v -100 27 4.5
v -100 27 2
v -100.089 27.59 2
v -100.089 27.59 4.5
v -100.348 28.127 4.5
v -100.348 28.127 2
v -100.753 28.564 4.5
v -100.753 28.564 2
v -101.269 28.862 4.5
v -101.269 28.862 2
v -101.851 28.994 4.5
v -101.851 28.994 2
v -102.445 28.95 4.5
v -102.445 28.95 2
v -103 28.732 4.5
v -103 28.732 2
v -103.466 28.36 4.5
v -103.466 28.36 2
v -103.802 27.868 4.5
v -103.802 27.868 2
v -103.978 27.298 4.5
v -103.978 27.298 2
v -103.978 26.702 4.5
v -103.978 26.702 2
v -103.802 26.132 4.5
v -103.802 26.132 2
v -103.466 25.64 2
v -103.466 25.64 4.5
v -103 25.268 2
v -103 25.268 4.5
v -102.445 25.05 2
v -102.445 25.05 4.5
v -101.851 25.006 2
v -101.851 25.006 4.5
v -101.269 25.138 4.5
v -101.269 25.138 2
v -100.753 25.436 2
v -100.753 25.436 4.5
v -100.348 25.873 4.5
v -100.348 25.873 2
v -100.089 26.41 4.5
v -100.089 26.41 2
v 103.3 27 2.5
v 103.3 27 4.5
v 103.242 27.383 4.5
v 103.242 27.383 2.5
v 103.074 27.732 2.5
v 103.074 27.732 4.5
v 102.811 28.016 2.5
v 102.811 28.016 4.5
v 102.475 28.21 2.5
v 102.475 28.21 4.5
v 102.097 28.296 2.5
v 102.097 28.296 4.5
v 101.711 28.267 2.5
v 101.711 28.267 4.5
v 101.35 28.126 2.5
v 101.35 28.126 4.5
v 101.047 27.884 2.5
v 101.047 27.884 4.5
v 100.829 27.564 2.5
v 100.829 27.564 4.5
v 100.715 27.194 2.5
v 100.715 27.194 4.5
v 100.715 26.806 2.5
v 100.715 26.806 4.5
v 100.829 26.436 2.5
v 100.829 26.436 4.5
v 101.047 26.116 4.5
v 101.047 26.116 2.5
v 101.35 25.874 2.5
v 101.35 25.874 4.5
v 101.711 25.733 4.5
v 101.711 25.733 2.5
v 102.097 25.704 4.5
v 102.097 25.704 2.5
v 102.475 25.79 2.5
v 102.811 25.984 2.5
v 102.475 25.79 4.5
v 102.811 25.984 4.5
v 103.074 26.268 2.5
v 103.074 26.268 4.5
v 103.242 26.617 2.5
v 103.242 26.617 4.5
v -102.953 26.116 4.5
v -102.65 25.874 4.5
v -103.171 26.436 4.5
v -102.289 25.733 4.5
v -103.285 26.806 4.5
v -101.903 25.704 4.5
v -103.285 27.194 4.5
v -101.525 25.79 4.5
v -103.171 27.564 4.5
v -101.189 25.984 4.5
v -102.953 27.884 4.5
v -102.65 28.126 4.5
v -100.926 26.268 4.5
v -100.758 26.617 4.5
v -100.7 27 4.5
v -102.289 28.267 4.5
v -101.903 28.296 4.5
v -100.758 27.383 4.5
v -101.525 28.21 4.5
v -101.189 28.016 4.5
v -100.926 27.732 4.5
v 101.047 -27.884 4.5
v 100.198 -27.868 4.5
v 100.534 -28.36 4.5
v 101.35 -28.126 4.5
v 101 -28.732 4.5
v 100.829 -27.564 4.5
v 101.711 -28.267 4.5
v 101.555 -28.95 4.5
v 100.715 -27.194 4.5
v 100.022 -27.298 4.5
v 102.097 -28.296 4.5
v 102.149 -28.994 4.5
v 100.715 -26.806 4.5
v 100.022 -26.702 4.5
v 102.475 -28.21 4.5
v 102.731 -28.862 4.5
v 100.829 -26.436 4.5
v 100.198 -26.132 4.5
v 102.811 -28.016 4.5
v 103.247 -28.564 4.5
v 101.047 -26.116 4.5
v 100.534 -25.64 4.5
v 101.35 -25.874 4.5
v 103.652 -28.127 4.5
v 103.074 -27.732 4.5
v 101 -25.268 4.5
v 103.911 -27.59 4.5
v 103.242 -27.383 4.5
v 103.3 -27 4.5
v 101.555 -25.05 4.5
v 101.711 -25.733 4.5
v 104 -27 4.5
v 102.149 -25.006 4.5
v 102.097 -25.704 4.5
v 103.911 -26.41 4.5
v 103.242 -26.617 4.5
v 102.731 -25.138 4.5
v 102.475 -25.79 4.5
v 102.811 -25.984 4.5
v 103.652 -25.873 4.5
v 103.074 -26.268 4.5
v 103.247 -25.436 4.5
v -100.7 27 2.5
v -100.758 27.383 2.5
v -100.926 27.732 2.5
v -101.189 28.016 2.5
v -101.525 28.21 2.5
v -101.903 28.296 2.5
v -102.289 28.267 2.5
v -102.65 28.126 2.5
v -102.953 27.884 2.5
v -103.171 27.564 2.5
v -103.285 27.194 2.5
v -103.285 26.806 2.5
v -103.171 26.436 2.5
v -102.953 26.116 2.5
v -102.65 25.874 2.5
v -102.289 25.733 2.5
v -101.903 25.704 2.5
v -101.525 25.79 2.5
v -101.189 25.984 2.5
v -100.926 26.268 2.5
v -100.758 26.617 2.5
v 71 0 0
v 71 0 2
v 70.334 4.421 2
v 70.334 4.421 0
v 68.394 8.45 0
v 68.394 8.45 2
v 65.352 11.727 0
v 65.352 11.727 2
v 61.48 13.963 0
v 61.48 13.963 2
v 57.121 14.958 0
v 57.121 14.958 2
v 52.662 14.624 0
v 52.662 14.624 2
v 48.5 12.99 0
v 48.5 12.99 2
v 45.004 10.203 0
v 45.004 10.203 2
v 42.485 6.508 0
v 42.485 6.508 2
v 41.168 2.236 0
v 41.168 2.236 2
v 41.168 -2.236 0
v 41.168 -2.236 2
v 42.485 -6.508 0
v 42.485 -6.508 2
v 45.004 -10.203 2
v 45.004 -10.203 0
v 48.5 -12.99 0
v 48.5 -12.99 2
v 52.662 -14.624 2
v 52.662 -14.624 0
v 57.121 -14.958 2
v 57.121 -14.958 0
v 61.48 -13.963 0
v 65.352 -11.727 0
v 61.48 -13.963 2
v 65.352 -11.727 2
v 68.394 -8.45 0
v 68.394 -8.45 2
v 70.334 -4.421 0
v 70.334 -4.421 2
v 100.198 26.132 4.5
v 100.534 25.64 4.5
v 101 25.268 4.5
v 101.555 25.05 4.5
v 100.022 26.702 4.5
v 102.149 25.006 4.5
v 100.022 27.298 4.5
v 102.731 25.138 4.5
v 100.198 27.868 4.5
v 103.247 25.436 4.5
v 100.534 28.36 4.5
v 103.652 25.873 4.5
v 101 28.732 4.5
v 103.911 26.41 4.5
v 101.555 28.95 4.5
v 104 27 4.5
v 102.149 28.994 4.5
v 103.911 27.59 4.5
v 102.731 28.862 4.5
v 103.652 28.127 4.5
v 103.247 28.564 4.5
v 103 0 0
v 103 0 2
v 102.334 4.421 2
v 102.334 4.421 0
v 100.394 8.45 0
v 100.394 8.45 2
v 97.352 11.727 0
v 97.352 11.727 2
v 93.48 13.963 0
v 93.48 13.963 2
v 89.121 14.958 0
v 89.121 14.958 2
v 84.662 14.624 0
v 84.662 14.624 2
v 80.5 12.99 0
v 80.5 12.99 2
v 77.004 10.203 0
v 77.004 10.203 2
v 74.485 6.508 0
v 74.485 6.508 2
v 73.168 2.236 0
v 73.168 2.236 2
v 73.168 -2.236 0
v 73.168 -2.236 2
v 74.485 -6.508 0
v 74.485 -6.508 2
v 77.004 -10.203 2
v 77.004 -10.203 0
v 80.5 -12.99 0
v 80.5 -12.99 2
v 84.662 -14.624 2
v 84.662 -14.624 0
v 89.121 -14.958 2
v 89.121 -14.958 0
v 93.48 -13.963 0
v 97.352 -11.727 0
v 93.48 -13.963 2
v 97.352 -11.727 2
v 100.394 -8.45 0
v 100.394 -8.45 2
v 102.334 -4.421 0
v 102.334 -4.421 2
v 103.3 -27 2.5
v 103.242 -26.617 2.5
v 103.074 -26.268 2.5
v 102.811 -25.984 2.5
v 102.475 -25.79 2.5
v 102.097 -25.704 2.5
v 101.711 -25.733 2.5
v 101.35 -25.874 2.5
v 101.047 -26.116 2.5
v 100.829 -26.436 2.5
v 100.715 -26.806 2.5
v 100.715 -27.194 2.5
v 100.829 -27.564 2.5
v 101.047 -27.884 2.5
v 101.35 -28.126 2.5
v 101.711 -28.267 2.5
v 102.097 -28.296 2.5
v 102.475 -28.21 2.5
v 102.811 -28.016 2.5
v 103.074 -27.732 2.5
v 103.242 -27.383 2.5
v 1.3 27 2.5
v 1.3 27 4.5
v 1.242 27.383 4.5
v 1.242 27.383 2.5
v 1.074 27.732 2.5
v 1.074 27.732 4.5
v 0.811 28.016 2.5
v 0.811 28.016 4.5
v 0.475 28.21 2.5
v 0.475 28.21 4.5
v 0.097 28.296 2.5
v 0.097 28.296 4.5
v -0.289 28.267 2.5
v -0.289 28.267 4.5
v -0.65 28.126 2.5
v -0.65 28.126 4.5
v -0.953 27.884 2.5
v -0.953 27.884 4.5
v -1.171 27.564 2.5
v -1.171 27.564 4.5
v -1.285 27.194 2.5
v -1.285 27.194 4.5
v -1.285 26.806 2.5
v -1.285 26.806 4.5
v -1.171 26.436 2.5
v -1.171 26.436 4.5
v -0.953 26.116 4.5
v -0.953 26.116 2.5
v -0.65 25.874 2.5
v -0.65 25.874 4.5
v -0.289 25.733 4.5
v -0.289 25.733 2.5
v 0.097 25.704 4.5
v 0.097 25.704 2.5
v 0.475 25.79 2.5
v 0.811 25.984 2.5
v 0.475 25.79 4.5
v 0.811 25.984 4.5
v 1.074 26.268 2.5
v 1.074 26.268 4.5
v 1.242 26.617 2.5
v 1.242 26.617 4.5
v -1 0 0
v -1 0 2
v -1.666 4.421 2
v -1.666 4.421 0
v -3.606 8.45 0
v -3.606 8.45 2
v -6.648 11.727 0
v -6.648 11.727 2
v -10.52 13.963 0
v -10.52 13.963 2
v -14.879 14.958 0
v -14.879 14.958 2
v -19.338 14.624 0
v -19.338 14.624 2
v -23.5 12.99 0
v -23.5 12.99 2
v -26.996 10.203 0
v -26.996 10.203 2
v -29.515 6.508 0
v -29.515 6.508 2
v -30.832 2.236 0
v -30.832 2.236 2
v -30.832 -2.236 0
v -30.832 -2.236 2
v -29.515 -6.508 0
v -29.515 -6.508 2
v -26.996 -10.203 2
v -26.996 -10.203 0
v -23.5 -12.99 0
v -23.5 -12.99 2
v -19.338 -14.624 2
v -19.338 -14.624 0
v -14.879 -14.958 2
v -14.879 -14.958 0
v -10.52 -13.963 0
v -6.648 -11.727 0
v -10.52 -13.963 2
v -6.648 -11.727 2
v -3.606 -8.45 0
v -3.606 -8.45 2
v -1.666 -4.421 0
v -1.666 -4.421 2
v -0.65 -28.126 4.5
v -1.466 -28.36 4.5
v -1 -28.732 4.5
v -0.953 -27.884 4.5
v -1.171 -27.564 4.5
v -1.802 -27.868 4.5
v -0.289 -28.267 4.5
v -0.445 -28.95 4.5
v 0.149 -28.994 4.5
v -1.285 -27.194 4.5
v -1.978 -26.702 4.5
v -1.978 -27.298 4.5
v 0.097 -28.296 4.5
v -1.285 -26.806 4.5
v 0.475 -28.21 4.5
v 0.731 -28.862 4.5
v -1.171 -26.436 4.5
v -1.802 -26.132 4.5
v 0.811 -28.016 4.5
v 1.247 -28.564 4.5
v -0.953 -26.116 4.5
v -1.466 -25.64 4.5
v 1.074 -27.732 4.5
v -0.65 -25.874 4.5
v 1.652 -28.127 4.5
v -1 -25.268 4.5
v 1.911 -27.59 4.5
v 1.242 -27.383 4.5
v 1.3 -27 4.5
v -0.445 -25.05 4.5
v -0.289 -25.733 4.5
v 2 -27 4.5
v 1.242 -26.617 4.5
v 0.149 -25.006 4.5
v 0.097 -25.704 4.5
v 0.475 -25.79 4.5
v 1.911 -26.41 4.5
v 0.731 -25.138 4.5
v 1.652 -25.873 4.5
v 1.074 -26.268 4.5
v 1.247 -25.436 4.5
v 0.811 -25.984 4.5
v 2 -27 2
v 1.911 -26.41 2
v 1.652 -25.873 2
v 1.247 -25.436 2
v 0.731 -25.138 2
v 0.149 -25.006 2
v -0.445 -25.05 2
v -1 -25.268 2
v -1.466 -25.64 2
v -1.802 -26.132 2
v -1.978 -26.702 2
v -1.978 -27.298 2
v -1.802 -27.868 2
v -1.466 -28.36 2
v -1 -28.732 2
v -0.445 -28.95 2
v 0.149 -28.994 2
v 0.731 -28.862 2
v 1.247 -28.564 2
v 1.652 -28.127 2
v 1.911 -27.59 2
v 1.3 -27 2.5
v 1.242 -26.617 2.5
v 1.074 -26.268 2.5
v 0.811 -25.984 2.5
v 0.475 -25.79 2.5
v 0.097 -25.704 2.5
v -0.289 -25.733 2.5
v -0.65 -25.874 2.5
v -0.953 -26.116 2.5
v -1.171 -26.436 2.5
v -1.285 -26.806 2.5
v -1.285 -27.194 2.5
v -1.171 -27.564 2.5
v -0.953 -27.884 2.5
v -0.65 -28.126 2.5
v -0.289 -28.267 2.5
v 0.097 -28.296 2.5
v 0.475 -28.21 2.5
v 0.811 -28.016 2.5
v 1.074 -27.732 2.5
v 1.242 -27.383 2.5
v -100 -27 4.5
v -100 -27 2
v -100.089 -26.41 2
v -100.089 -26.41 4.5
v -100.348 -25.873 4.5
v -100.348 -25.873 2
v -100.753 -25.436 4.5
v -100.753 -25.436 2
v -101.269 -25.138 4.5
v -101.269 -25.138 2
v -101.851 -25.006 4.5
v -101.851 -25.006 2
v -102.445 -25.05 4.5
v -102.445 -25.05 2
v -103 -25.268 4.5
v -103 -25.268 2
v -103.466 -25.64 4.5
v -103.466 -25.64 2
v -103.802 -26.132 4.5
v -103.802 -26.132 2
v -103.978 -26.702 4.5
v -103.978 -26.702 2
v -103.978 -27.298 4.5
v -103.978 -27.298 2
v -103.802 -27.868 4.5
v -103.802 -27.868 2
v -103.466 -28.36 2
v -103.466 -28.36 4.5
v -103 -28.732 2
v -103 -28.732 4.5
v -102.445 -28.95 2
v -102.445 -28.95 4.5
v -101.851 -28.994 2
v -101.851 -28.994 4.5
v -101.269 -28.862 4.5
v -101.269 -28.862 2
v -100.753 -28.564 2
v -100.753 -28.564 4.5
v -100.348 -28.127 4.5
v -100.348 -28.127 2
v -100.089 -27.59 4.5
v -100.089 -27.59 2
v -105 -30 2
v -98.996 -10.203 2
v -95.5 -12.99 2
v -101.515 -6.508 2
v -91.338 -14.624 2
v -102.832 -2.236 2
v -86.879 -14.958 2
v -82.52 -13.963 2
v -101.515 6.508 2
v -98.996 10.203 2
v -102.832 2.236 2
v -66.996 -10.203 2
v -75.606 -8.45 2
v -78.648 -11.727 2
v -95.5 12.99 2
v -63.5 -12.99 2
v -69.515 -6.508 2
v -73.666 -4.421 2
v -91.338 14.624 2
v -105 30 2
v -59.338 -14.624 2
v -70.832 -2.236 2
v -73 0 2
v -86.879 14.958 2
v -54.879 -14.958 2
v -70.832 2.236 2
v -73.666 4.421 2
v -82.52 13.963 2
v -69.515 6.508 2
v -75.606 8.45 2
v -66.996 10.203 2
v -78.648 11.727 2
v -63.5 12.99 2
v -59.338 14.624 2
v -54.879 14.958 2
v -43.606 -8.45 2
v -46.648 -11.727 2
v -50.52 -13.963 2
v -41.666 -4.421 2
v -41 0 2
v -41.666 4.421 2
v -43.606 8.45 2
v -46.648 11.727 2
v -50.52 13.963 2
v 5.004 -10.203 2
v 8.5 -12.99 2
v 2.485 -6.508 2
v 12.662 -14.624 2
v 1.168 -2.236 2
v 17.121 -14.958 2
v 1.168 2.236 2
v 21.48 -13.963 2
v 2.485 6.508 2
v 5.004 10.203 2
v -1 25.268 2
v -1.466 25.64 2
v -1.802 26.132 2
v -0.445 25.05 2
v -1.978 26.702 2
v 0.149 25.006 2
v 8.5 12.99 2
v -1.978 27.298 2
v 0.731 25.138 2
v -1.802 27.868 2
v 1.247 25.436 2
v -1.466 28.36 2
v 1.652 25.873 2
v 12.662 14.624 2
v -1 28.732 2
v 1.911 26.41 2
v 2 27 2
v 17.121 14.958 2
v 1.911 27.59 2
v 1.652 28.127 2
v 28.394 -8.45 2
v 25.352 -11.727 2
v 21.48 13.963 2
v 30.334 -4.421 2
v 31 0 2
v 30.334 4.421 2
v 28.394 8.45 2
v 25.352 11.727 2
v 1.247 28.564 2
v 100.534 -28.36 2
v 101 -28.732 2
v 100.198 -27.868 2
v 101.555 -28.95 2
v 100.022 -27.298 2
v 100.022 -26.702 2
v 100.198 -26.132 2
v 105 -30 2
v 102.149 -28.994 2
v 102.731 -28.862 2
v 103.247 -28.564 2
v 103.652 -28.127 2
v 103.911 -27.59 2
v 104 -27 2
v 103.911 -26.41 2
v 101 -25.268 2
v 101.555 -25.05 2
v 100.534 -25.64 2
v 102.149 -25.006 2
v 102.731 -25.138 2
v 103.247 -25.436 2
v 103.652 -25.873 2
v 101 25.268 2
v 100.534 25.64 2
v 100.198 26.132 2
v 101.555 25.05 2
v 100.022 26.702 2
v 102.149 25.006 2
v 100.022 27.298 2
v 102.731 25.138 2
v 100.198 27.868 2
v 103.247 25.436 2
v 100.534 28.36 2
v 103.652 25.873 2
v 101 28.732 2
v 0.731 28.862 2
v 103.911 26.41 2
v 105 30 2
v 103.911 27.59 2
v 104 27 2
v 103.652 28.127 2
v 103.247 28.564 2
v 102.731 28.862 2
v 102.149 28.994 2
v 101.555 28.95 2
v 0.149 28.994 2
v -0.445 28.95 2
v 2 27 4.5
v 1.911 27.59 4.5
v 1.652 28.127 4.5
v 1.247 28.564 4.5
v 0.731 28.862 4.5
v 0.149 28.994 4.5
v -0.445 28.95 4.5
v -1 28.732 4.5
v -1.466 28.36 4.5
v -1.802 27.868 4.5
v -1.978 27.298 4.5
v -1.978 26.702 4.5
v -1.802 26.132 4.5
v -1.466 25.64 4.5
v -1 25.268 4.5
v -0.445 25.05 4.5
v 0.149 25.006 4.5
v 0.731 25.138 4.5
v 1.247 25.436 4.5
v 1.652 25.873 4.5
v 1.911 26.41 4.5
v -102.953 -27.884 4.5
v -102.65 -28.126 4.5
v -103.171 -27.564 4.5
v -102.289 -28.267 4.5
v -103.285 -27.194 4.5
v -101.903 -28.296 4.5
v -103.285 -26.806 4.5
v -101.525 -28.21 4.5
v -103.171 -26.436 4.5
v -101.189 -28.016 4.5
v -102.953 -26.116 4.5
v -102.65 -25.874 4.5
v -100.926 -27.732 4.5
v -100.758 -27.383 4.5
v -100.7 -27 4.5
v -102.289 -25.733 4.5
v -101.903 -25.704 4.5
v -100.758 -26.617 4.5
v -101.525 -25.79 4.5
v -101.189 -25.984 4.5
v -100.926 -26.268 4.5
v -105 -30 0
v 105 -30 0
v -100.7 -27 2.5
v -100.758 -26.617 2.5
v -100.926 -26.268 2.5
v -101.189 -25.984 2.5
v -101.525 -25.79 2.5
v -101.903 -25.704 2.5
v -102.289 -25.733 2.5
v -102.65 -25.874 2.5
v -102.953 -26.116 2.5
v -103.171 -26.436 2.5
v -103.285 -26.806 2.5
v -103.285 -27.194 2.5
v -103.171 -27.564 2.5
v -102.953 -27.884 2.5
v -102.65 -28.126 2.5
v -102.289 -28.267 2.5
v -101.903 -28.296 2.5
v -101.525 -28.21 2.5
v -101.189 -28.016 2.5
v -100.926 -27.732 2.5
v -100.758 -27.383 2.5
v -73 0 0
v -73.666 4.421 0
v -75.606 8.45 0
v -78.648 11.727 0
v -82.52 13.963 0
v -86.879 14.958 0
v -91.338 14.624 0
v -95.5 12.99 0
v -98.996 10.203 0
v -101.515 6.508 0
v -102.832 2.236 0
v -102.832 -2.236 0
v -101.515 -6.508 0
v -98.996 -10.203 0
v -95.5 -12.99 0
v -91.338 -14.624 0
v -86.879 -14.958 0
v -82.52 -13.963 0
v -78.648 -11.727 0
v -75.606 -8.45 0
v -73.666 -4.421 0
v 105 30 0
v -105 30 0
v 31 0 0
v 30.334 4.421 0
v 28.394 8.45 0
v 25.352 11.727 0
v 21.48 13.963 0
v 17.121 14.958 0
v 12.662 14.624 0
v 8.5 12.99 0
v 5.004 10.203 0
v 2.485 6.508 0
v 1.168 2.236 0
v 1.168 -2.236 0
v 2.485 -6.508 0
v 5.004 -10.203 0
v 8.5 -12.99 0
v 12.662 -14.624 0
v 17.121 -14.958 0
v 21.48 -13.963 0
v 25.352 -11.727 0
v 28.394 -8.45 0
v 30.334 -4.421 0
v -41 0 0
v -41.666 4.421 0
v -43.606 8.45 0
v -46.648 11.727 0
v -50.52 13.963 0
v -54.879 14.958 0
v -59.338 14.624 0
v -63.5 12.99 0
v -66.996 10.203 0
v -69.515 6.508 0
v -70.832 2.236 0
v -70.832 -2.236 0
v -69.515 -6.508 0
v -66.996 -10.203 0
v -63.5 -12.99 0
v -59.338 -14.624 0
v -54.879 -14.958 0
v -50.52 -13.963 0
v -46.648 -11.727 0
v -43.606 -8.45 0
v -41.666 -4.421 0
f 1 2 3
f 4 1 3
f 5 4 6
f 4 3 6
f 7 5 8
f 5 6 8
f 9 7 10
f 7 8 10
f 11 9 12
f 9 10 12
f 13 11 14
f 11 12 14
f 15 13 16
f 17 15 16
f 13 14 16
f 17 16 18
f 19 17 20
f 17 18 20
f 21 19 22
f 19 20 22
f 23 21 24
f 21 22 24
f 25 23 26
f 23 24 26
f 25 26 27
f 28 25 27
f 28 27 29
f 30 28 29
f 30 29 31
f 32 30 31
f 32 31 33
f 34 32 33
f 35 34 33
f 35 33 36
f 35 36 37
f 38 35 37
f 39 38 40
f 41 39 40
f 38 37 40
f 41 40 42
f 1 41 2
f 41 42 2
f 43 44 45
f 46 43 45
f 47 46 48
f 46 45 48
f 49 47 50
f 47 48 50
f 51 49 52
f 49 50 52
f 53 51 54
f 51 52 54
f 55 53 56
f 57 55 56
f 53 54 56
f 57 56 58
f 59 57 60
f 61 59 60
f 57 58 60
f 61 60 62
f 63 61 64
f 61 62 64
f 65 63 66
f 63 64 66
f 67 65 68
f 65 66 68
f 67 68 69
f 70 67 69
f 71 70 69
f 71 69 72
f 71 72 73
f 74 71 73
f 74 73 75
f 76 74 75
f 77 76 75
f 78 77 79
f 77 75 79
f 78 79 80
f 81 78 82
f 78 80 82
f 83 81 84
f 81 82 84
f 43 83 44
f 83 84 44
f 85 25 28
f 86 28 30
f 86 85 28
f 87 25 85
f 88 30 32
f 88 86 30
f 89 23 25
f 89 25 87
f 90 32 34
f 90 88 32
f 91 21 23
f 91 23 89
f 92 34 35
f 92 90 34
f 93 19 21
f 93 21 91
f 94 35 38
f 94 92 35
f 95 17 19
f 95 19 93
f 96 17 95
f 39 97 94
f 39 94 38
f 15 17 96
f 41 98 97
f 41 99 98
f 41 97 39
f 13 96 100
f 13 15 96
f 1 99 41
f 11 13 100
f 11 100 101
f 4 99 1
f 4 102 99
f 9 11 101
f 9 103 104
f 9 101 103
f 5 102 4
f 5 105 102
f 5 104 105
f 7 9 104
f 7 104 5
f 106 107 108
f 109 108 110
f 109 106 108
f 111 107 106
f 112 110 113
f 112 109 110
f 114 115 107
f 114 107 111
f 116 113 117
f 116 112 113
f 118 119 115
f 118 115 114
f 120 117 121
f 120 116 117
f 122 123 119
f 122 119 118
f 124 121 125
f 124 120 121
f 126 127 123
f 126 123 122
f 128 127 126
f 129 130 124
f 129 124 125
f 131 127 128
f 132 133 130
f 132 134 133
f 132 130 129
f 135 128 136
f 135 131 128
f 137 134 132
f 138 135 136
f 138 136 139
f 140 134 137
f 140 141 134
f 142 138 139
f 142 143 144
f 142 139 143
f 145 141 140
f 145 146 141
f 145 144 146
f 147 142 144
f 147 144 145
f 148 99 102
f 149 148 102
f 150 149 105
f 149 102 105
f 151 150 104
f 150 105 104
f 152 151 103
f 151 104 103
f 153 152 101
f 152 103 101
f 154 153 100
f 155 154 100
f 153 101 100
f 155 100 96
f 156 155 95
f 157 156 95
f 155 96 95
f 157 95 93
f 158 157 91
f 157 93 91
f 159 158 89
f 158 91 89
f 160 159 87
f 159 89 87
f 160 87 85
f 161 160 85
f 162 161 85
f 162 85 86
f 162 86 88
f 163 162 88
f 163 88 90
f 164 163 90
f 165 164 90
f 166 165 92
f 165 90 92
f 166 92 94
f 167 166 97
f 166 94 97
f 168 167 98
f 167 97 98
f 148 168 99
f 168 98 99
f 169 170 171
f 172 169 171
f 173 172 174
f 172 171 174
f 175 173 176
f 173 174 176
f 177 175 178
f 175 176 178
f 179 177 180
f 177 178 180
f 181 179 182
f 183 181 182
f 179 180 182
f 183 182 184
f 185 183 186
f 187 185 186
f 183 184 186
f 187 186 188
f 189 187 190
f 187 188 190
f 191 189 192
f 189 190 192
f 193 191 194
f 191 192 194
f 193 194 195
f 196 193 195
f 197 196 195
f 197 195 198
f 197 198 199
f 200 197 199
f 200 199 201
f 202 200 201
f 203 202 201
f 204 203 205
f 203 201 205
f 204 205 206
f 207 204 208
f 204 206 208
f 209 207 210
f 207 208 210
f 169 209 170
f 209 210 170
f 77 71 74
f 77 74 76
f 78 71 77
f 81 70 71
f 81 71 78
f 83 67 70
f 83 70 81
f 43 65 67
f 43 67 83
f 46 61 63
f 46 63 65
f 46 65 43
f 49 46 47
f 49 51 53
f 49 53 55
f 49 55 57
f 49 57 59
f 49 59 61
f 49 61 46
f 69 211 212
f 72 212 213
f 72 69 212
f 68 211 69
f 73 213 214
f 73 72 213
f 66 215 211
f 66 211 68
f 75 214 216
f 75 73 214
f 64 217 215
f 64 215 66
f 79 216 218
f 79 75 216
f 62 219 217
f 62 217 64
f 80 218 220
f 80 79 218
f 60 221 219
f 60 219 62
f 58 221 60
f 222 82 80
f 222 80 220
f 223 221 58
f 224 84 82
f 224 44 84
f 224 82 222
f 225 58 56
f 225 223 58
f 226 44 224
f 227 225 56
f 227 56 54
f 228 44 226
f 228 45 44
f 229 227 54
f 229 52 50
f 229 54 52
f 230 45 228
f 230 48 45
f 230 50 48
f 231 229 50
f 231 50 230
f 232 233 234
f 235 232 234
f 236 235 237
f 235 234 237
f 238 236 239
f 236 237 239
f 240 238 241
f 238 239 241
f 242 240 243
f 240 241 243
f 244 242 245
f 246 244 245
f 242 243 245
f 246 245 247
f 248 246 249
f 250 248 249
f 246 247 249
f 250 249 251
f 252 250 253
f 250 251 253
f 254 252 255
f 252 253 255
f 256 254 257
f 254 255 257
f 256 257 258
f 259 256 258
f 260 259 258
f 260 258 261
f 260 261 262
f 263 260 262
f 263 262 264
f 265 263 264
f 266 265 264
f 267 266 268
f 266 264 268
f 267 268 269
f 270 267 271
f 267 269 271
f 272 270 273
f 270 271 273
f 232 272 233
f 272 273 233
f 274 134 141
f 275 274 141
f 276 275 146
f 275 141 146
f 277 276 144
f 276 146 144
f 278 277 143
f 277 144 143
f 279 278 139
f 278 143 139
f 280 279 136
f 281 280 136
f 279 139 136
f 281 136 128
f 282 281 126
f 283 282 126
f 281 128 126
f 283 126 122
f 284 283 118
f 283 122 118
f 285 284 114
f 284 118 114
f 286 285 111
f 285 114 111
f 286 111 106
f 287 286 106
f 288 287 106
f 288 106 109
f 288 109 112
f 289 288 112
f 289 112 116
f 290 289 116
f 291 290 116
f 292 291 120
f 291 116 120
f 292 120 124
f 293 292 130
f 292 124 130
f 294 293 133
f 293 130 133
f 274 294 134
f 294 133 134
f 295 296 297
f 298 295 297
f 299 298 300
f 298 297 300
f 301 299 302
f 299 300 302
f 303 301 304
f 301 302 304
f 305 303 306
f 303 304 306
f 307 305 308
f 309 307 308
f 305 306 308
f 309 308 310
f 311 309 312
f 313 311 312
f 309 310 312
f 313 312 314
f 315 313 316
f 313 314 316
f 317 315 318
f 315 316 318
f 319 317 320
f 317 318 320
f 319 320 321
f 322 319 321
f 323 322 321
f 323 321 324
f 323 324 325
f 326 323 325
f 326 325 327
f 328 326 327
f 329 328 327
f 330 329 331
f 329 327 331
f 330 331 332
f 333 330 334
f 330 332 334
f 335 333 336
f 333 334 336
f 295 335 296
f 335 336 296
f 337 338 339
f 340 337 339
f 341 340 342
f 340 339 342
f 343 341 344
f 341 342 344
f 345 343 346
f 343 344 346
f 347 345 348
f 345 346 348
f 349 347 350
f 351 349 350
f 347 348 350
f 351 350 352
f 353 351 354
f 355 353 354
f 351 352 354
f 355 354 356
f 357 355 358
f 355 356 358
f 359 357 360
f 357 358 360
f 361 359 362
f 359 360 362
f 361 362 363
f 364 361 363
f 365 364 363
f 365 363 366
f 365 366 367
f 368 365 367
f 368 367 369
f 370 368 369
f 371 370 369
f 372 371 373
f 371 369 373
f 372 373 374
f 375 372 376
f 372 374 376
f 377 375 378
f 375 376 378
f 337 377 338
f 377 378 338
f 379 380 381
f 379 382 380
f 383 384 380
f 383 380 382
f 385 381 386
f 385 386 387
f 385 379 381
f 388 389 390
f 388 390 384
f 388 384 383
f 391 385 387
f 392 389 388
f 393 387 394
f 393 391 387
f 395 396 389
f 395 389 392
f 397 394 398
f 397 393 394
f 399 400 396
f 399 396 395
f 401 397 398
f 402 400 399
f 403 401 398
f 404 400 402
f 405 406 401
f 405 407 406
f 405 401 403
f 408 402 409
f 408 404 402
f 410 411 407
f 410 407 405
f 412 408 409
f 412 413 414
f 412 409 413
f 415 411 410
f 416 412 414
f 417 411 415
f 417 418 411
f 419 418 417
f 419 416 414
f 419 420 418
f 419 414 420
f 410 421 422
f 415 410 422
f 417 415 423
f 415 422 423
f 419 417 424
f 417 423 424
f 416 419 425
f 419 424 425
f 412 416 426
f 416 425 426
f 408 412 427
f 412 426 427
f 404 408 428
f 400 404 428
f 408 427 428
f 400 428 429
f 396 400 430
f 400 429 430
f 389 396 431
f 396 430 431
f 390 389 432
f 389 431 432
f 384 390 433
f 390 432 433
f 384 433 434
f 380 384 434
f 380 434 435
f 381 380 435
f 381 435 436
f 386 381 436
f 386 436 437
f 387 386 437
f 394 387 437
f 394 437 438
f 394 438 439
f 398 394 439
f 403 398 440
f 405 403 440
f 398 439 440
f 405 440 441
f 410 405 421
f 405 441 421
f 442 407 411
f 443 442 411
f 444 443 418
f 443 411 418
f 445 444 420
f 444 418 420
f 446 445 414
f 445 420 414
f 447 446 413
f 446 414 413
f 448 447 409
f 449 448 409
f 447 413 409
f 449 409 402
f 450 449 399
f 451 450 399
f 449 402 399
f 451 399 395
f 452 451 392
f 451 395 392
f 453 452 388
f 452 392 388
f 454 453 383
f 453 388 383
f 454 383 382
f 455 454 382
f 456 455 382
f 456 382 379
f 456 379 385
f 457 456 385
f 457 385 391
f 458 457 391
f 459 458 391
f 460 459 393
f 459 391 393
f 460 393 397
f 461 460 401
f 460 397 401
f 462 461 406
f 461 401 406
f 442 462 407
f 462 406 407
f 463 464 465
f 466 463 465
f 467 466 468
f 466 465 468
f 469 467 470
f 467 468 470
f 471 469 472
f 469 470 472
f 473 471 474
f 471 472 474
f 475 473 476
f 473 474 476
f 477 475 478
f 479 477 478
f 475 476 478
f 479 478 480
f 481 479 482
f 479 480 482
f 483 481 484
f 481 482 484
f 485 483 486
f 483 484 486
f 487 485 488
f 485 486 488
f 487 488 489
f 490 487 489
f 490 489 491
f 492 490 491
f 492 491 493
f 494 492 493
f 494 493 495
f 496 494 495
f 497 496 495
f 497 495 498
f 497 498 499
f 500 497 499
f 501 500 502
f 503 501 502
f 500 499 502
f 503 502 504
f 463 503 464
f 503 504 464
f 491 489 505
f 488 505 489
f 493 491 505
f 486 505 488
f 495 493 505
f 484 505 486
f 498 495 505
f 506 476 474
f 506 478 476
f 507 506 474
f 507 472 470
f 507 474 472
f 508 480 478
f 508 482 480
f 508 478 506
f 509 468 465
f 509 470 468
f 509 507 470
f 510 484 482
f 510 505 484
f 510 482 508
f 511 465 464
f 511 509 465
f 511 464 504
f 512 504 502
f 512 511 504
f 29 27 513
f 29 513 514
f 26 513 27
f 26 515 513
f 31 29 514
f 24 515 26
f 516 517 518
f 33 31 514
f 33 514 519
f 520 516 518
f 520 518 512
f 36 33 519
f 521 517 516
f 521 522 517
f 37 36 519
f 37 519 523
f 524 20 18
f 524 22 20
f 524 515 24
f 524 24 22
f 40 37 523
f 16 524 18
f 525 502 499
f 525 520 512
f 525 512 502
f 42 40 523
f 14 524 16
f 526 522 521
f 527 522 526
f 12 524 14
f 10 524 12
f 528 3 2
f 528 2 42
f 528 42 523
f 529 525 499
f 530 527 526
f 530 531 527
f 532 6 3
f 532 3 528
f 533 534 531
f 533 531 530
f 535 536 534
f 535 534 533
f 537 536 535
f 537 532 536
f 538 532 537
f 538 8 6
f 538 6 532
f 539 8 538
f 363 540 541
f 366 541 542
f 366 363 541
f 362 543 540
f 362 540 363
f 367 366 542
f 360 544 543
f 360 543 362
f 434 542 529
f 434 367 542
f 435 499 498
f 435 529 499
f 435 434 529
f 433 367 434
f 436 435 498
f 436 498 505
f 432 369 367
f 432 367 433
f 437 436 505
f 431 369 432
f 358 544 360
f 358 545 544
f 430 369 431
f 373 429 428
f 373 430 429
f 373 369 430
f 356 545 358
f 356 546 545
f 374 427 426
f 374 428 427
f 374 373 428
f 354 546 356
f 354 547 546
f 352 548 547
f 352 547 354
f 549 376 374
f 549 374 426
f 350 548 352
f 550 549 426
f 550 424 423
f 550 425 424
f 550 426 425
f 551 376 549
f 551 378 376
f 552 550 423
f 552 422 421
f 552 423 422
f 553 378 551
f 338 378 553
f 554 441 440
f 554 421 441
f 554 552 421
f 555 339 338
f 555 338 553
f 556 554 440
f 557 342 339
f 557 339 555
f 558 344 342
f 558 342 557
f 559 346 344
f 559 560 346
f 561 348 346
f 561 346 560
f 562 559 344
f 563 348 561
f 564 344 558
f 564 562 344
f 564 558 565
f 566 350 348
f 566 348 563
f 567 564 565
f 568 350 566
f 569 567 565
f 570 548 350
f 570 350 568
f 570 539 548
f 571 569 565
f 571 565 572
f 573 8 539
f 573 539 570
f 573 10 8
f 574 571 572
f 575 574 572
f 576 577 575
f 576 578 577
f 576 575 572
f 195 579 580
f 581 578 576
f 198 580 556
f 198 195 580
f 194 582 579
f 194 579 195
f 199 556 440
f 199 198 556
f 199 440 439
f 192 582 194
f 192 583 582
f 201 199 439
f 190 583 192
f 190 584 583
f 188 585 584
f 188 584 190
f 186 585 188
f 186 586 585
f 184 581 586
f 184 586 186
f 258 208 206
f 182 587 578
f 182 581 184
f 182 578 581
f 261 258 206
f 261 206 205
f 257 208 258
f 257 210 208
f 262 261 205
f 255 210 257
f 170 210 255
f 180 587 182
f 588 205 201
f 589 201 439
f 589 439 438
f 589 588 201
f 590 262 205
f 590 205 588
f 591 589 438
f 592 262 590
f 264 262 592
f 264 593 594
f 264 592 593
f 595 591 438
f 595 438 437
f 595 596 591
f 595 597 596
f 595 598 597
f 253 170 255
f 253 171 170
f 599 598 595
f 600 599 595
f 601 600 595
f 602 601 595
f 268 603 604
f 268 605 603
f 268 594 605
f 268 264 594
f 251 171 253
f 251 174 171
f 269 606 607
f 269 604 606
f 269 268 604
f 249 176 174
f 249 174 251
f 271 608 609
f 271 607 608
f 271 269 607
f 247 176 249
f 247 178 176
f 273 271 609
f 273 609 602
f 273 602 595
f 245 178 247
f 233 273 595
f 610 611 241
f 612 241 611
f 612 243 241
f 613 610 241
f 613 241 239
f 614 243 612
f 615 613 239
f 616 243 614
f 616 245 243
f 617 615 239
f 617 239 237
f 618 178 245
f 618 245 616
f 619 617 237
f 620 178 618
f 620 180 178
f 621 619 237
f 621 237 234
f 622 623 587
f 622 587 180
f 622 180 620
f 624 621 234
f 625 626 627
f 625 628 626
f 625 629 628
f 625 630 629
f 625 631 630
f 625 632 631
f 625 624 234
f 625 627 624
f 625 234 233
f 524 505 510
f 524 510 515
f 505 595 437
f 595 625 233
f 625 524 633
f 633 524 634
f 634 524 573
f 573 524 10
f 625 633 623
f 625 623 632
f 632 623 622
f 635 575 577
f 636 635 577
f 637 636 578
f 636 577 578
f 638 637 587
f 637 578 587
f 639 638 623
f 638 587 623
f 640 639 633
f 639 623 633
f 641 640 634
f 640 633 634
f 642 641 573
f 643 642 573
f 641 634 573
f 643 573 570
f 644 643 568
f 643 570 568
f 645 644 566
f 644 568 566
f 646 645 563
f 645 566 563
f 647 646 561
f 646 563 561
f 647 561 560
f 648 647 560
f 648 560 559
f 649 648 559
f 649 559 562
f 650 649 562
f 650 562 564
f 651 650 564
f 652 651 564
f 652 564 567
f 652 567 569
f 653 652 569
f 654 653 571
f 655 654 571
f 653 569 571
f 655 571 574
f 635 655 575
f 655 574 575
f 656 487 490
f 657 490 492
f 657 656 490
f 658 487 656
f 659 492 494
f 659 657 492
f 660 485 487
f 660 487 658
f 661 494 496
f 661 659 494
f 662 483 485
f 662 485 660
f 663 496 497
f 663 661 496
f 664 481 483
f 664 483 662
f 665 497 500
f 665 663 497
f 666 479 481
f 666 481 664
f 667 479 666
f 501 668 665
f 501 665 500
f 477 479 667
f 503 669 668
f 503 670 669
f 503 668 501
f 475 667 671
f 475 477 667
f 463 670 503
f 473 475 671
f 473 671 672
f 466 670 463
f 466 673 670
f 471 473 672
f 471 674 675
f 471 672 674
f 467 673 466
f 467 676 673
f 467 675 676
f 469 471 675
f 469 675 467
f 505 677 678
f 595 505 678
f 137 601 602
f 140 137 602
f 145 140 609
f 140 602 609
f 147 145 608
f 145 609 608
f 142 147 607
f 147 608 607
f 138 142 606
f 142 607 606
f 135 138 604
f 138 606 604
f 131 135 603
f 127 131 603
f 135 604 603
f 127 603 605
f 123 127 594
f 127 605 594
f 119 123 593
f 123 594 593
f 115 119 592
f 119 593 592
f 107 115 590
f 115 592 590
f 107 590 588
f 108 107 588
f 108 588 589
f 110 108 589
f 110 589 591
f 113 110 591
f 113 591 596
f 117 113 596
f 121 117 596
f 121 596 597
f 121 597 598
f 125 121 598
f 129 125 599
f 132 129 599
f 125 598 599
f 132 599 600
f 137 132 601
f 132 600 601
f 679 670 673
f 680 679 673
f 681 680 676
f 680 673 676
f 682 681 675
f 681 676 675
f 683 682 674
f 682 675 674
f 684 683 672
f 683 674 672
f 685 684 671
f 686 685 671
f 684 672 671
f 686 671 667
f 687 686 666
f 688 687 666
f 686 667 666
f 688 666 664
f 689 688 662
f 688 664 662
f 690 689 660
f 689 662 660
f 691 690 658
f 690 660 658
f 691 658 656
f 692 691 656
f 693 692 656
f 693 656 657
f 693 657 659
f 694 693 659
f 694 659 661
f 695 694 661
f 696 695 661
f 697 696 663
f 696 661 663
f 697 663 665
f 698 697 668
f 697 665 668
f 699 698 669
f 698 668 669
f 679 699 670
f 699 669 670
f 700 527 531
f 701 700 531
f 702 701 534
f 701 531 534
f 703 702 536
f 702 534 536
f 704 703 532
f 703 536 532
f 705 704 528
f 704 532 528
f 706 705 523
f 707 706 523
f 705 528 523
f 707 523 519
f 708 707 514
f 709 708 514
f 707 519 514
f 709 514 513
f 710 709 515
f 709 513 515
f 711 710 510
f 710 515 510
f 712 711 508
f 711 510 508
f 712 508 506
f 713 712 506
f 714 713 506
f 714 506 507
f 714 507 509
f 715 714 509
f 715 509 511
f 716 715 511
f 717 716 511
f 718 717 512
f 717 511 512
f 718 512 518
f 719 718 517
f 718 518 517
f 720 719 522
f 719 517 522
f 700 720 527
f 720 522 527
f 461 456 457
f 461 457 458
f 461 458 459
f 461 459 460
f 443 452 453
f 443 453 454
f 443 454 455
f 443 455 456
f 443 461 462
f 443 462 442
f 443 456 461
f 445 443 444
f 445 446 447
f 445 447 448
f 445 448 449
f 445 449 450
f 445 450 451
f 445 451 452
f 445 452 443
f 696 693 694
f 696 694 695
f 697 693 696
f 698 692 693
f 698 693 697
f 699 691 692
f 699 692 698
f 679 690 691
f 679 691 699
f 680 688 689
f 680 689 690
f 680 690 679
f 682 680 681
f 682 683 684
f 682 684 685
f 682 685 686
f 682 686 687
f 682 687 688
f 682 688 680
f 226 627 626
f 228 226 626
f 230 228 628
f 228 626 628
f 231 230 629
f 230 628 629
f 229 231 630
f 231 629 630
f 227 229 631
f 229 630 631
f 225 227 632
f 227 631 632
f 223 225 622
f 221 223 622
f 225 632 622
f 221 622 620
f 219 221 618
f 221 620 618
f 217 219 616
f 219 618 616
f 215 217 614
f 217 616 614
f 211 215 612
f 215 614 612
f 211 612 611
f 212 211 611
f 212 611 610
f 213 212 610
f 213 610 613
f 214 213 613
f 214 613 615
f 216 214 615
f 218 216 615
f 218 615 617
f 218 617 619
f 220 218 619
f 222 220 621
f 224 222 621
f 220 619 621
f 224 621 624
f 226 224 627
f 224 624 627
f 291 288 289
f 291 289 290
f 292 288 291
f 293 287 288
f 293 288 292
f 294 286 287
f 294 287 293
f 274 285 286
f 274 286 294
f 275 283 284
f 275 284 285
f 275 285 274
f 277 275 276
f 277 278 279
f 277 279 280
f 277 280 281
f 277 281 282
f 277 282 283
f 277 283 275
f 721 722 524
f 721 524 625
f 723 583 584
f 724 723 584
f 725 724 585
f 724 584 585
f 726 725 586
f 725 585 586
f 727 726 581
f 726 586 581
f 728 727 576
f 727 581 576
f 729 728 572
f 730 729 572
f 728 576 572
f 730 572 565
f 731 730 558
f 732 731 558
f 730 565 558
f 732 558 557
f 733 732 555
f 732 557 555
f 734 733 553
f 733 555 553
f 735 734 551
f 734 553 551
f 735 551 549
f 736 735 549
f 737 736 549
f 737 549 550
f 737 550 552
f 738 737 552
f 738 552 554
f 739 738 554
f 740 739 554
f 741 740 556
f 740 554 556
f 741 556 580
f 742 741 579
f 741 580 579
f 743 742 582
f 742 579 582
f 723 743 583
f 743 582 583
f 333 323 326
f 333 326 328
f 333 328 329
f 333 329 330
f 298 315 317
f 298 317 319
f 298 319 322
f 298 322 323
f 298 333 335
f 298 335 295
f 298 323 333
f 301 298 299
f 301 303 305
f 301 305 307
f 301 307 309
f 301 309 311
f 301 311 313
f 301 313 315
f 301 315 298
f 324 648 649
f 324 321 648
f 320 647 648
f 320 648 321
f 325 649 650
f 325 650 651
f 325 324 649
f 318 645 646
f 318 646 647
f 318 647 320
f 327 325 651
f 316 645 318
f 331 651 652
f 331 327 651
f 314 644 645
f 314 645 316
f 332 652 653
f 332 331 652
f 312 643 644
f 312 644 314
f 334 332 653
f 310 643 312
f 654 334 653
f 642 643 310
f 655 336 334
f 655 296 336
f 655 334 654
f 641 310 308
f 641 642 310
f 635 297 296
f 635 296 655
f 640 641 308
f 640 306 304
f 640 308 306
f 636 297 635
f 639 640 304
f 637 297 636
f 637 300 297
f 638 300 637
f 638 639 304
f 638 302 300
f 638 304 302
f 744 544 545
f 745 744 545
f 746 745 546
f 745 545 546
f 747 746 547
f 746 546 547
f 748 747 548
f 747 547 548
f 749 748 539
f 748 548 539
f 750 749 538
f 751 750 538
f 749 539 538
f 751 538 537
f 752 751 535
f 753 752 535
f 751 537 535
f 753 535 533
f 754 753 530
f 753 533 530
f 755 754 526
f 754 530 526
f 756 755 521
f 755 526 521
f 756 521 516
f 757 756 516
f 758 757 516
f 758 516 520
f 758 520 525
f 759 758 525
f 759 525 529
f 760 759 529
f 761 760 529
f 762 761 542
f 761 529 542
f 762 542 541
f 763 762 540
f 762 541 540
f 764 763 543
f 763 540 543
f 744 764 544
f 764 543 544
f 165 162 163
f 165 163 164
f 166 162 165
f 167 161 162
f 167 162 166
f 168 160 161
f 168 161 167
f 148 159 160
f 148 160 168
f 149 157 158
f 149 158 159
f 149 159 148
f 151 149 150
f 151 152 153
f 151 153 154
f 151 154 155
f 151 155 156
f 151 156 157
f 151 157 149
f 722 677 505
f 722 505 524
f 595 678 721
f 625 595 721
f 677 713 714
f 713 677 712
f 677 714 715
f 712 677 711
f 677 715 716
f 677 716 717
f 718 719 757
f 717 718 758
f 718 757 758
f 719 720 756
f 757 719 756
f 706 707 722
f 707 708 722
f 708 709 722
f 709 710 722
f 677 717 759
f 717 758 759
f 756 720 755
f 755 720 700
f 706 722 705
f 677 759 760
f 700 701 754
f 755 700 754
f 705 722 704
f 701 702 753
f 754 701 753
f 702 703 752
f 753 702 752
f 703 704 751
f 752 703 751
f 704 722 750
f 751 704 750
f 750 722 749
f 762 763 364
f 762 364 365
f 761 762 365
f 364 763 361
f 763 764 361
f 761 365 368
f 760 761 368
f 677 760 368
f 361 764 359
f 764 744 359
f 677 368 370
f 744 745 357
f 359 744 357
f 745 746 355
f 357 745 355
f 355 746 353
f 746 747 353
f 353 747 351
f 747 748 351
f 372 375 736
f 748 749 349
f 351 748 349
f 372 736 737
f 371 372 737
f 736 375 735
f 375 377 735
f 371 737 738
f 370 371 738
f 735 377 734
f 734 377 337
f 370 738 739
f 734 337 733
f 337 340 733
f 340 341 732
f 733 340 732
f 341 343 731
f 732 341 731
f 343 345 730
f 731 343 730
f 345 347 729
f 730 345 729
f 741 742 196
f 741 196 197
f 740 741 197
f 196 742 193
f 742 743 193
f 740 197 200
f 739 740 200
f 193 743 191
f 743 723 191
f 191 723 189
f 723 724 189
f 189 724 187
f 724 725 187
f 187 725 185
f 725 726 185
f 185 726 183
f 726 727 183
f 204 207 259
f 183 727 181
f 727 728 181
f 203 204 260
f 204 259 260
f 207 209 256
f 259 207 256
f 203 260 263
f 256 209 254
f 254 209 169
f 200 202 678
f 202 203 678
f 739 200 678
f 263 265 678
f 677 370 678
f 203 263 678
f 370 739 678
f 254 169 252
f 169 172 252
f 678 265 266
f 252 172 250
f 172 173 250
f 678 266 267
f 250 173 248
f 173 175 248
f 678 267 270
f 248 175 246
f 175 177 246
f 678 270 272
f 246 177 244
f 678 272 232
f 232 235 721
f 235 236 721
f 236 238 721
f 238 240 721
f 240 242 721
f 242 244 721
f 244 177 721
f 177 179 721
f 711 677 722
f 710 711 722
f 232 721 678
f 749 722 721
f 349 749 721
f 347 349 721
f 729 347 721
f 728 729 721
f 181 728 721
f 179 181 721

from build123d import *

# Parameters (mm, degrees)
F0_W      = 210
F0_H      = 60
F1_DEPTH  = 2
F2_R      = 15
F3_DEPTH  = 2
F4_R      = 2
F5_DEPTH  = 2.5
F6_R      = 1.3
F7_DEPTH  = 2
F8_R      = 1.3
F9_DEPTH  = 2
F10_R     = 1.3
F11_DEPTH = 2
F12_R     = 1.3
F13_DEPTH = 2
F14_R     = 1.3
F15_DEPTH = 2
F16_R     = 1.3
F17_DEPTH = 2


with BuildPart() as f1:
    # F0 (on Top) → F1 (new body)
    with BuildSketch(Plane.XY):
        Rectangle(F0_W, F0_H)
    extrude(amount=F1_DEPTH)

    # F2 (on face) → F3 (cut)
    with BuildSketch(Plane.XY.offset(2)):
        with Locations((-88, 0)):
            Circle(F2_R)
        with Locations((-56, 0)):
            Circle(F2_R)
        with Locations((-16, 0)):
            Circle(F2_R)
        with Locations((16, 0)):
            Circle(F2_R)
        with Locations((56, 0)):
            Circle(F2_R)
        with Locations((88, 0)):
            Circle(F2_R)
    extrude(amount=-F3_DEPTH, mode=Mode.SUBTRACT)

    # F4 (on face) → F5 (join)
    with BuildSketch(Plane.XY.offset(2)):
        with Locations((-102, -27)):
            Circle(F4_R)
        with Locations((-102, 27)):
            Circle(F4_R)
        with Locations((102, -27)):
            Circle(F4_R)
        with Locations((102, 27)):
            Circle(F4_R)
        with Locations((0, 27)):
            Circle(F4_R)
        with Locations((0, -27)):
            Circle(F4_R)
    extrude(amount=F5_DEPTH)

    # F6 (on face) → F7 (cut)
    with BuildSketch(Plane.XY.offset(4.5)):
        with Locations((0, -27)):
            Circle(F6_R)
    extrude(amount=-F7_DEPTH, mode=Mode.SUBTRACT)

    # F8 (on face) → F9 (cut)
    with BuildSketch(Plane.XY.offset(4.5)):
        with Locations((-102, -27)):
            Circle(F8_R)
    extrude(amount=-F9_DEPTH, mode=Mode.SUBTRACT)

    # F10 (on face) → F11 (cut)
    with BuildSketch(Plane.XY.offset(4.5)):
        with Locations((-102, 27)):
            Circle(F10_R)
    extrude(amount=-F11_DEPTH, mode=Mode.SUBTRACT)

    # F12 (on face) → F13 (cut)
    with BuildSketch(Plane.XY.offset(4.5)):
        with Locations((0, 27)):
            Circle(F12_R)
    extrude(amount=-F13_DEPTH, mode=Mode.SUBTRACT)

    # F14 (on face) → F15 (cut)
    with BuildSketch(Plane.XY.offset(4.5)):
        with Locations((102, 27)):
            Circle(F14_R)
    extrude(amount=-F15_DEPTH, mode=Mode.SUBTRACT)

    # F16 (on face) → F17 (cut)
    with BuildSketch(Plane.XY.offset(4.5)):
        with Locations((102, -27)):
            Circle(F16_R)
    extrude(amount=-F17_DEPTH, mode=Mode.SUBTRACT)


solid = f1.part
